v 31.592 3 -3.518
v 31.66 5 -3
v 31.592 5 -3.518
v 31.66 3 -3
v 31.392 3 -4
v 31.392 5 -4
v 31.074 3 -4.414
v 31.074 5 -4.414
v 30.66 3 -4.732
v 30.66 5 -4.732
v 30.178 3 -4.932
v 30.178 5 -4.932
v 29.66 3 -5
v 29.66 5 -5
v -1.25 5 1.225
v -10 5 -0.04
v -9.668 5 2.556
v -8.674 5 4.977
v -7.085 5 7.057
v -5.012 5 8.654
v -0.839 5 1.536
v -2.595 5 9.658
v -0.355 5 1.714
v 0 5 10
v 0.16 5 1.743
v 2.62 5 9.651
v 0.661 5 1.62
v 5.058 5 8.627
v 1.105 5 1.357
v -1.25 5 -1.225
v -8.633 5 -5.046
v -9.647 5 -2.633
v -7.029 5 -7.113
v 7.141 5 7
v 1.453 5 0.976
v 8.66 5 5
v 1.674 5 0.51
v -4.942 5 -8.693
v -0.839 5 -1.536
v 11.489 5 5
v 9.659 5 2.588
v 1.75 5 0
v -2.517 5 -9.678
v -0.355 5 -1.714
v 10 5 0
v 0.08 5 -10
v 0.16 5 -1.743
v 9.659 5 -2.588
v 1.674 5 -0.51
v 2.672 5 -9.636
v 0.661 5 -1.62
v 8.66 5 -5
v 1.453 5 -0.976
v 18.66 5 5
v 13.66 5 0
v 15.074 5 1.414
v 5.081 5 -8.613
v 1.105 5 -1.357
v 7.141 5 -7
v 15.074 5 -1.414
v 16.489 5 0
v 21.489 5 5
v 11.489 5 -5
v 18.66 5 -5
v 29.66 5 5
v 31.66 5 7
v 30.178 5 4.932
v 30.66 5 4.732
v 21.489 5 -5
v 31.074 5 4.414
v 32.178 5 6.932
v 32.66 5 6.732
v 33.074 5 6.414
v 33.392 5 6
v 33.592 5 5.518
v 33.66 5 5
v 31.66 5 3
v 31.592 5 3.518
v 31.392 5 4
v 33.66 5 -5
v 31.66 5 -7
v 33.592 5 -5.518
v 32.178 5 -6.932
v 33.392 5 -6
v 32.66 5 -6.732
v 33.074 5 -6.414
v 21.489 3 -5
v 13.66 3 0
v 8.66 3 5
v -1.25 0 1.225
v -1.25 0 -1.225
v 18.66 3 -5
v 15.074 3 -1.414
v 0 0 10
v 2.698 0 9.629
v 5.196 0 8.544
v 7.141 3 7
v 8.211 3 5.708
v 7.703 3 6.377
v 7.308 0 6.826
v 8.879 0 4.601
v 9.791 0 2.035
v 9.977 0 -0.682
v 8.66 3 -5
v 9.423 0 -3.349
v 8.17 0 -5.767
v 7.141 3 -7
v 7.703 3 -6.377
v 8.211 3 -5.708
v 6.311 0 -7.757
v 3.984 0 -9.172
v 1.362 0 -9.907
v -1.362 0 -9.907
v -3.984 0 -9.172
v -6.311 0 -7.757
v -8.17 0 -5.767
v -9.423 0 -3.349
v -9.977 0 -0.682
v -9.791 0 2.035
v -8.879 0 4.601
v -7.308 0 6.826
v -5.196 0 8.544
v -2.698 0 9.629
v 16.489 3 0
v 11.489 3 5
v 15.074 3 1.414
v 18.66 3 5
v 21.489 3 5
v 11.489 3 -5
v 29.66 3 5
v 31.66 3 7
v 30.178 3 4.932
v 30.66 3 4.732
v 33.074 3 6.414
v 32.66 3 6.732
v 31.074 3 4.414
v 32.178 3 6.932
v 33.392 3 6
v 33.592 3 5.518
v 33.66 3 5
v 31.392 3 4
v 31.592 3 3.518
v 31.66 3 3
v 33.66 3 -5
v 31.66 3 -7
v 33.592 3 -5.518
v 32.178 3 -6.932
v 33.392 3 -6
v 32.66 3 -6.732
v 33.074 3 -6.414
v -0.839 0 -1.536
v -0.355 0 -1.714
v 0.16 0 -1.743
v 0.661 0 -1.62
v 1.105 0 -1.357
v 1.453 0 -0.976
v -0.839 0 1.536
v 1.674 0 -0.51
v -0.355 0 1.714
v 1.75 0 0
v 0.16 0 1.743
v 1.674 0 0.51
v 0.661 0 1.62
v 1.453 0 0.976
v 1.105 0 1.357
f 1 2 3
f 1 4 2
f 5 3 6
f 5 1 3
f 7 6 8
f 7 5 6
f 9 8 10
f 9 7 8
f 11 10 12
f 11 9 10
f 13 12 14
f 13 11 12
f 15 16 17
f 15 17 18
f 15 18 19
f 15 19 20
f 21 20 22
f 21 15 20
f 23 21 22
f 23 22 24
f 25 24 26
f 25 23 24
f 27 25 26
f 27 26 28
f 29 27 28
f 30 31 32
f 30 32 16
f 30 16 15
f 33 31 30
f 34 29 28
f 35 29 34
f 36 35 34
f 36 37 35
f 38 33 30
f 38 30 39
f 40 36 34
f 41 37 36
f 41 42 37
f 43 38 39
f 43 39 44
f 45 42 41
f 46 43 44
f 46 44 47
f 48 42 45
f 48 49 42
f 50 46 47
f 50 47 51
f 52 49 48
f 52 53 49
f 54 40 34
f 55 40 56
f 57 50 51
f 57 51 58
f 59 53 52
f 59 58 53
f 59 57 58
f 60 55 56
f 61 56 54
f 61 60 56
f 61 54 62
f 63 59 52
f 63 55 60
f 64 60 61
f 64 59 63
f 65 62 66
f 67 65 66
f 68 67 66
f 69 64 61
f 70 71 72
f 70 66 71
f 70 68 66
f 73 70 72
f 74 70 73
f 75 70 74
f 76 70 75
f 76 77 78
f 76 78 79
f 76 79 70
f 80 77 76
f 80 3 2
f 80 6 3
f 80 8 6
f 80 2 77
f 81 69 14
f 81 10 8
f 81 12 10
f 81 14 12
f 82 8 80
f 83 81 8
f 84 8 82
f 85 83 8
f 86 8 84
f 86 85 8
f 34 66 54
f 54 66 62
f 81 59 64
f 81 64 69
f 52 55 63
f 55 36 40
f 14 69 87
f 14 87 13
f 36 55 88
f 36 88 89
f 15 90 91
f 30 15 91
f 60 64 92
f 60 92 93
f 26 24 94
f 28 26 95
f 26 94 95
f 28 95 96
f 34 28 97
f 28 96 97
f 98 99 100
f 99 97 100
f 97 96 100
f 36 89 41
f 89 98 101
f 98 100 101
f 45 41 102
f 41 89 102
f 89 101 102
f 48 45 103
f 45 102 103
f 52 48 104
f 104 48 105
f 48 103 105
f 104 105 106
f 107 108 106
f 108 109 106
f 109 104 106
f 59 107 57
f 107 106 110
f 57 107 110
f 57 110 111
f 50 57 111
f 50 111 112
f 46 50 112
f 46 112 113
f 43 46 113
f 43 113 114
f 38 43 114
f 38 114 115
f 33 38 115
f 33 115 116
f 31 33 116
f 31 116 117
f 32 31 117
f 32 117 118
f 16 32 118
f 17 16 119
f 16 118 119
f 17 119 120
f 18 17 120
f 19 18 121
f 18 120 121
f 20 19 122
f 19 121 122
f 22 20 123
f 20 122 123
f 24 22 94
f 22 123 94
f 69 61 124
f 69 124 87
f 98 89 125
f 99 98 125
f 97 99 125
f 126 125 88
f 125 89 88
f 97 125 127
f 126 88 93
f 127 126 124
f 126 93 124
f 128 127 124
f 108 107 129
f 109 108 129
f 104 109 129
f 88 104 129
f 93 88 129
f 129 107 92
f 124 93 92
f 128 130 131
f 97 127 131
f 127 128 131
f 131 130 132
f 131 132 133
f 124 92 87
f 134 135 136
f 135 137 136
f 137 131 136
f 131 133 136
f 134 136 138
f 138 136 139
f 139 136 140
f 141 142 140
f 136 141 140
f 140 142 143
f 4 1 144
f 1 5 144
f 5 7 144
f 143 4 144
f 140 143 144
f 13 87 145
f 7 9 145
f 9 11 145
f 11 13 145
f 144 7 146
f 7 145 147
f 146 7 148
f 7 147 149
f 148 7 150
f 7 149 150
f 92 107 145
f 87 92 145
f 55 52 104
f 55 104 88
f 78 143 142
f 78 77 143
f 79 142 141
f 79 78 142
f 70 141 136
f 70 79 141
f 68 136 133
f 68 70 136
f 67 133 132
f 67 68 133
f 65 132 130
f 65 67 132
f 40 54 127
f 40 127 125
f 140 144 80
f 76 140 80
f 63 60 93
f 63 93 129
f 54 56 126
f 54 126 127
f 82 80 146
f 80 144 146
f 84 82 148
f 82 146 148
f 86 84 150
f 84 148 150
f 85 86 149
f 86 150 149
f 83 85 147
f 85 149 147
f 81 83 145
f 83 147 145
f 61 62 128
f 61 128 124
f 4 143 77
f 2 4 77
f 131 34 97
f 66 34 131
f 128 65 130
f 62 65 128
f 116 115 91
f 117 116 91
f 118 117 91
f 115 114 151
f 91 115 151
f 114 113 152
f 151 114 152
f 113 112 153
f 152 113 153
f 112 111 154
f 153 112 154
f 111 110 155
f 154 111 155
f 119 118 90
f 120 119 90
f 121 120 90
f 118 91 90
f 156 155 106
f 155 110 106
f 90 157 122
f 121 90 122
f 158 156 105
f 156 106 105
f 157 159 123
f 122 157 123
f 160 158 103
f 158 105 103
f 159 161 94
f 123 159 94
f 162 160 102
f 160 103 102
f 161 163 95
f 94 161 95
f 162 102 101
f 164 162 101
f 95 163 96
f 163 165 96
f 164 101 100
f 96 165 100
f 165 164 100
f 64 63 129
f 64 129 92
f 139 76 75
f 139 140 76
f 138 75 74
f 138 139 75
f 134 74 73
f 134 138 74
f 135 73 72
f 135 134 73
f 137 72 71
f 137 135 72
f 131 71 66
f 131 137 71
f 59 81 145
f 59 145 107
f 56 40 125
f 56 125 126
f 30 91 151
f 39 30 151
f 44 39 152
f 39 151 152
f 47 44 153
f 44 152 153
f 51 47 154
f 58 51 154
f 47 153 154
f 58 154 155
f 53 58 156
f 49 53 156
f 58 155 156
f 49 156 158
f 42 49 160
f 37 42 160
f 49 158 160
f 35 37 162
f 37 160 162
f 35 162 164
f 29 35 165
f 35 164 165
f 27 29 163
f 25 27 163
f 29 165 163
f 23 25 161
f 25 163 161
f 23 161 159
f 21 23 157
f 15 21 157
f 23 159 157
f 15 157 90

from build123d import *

# Parameters (mm, degrees)
SKETCH1_R           = 10
BOSS_EXTRUDE1_DEPTH = 5
BOSS_EXTRUDE2_DEPTH = 2
BOSS_EXTRUDE3_REACH = 39.189
SKETCH3_W           = 2
SKETCH3_H           = 2
BOSS_EXTRUDE5_DEPTH = 2
FILLET1_R           = 2


with BuildPart() as part:
    # Sketch1 → Boss-Extrude1 (new body)
    with BuildSketch(Plane(origin=(0, 0, 0), x_dir=(1, 0, 0), z_dir=(0, 1, 0))):
        with Locations(Location((0, 0, 0), (0, 0, 270))):
            Circle(SKETCH1_R)
        with BuildLine():
            Line((-1.25, -1.224744871), (-1.25, 1.224744871))
            ThreePointArc((-1.25, 1.224744871), (1.75, 0), (-1.25, -1.224744871))
        make_face(mode=Mode.SUBTRACT)
    extrude(amount=BOSS_EXTRUDE1_DEPTH)

    # Sketch2 → Boss-Extrude2 (add)
    with BuildSketch(Plane(origin=(0, 5, 0), x_dir=(1, 0, 0), z_dir=(0, 1, 0))):
        Polygon((8.660254038, 5), (33.660254038, 5), (33.660254038, 7), (7.141428429, 7), align=None)
        Polygon((7.141428429, -7), (33.660254038, -7), (33.660254038, -5), (8.660254038, -5), align=None)
    extrude(amount=-BOSS_EXTRUDE2_DEPTH)

    # Sketch3 → Boss-Extrude3 (add, up to next)
    with BuildSketch(Plane(origin=(0, 0, 5), x_dir=(-1, 0, 0), z_dir=(0, 0, -1)), mode=Mode.PRIVATE) as boss_extrude3_sk1:
        with Locations((-32.660254038, 4)):
            Rectangle(SKETCH3_W, SKETCH3_H)
    boss_extrude3_tool1 = extrude(boss_extrude3_sk1.sketch, amount=BOSS_EXTRUDE3_REACH, mode=Mode.PRIVATE) - part.part
    add(boss_extrude3_tool1.solids().sort_by_distance((32.660254, 4, 5))[0])

    # Sketch4 → Boss-Extrude5 (add)
    with BuildSketch(Plane(origin=(0, 5, 0), x_dir=(1, 0, 0), z_dir=(0, 1, 0))):
        Polygon((11.488681163, -5), (15.0744676, -1.414213562), (18.660254038, -5), (21.488681163, -5), (16.488681163, 0), (21.488681163, 5), (18.660254038, 5), (15.0744676, 1.414213562), (11.488681163, 5), (8.660254038, 5), (13.660254038, 0), (8.660254038, -5), align=None)
    extrude(amount=-BOSS_EXTRUDE5_DEPTH)

    # Fillet1
    fillet1_edges = [part.edges().sort_by_distance(p)[0] for p in [
        (33.660254038, 4, -7),
        (33.660254038, 4, 7),
        (31.660254038, 4, -5),
        (31.660254038, 4, 5),
    ]]
    fillet(fillet1_edges, radius=FILLET1_R)


solid = part.part
